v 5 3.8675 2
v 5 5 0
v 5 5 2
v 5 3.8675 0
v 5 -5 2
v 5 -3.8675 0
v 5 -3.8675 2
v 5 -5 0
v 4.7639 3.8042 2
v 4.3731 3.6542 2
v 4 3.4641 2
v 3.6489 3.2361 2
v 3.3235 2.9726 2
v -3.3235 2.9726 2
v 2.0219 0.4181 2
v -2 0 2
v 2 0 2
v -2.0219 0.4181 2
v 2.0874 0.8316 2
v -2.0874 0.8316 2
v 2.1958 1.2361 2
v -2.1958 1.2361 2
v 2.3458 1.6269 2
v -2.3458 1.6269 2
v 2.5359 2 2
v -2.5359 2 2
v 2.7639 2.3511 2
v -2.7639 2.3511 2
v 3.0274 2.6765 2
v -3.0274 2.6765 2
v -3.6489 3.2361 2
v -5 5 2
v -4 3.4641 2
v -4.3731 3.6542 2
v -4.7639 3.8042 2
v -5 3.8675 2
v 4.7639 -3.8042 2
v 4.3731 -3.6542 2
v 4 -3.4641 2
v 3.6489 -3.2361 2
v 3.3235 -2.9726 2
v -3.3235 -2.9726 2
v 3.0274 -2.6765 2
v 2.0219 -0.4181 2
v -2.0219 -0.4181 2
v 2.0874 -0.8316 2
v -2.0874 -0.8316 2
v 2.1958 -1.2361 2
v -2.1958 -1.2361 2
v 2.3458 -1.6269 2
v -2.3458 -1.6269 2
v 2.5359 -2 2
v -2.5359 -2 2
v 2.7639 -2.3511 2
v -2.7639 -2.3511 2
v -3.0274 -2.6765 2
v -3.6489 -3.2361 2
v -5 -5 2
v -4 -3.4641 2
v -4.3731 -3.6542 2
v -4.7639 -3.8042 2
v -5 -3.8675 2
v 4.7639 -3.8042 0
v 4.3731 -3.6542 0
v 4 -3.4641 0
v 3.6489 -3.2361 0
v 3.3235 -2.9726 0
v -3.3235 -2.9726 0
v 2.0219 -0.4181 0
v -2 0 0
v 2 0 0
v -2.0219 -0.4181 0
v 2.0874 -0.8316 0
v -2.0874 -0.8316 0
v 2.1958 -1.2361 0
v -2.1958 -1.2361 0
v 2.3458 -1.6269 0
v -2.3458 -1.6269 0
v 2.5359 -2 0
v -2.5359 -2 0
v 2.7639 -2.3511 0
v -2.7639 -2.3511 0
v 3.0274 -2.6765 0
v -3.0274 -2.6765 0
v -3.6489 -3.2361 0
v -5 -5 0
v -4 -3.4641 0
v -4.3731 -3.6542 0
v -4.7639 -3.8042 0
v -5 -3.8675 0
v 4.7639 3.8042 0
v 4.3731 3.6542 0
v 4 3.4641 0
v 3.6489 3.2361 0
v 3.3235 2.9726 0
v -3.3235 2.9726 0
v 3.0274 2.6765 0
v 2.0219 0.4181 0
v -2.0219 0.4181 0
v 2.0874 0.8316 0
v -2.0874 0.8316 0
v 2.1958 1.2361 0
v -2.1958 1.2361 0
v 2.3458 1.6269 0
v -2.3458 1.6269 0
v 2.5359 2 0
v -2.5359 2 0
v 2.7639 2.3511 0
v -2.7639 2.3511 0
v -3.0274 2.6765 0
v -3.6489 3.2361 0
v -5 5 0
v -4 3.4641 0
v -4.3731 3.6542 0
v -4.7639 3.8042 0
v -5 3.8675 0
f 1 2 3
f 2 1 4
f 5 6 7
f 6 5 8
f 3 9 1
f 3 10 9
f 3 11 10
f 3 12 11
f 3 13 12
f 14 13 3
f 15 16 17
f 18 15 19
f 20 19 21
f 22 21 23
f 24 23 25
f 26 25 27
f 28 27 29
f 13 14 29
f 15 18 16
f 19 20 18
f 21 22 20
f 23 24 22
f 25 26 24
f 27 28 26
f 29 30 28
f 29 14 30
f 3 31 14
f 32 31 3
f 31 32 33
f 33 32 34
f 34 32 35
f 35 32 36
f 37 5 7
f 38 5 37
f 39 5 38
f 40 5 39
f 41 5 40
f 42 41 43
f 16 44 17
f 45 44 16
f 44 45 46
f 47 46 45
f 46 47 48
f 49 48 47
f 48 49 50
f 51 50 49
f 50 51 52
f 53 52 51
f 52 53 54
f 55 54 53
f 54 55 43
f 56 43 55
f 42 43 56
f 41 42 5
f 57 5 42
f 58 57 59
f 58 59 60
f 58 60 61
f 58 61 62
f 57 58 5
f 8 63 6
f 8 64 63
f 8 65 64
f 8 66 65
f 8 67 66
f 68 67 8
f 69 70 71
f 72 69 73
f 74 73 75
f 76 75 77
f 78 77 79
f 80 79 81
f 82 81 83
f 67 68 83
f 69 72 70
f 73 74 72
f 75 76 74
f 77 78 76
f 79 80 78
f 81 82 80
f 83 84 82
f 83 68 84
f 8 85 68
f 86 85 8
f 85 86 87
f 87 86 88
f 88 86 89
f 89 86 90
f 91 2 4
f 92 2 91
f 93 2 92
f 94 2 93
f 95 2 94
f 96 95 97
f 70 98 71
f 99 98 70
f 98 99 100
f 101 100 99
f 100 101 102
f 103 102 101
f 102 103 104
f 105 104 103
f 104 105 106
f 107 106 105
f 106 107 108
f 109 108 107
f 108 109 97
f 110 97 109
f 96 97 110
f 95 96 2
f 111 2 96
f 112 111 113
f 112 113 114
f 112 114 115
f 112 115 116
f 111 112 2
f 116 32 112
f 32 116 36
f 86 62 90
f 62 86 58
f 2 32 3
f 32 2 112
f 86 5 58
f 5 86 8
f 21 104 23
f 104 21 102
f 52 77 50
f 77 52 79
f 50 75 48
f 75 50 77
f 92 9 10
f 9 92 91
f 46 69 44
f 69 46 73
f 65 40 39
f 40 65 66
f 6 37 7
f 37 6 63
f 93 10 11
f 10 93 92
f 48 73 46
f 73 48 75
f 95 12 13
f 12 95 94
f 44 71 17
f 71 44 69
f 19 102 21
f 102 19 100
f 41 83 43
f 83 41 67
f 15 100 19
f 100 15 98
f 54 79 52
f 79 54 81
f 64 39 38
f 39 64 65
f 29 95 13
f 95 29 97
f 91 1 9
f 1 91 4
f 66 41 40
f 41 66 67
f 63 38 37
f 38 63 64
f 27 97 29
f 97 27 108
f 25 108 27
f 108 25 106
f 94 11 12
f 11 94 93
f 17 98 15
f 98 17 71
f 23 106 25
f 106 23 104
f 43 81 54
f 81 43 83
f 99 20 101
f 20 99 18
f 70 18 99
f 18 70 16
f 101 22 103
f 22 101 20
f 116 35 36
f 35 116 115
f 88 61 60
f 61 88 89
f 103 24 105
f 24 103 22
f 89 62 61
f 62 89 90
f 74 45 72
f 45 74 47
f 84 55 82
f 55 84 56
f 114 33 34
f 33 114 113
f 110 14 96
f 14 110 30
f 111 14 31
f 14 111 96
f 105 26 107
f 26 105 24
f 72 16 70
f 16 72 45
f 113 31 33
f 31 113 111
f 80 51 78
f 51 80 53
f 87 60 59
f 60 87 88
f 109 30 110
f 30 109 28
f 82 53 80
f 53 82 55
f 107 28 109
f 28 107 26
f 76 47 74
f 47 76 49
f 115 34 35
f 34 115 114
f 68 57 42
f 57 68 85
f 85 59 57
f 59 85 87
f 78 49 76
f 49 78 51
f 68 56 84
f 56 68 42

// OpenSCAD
$fn = $preview ? 20 : 60;translate(v = [0, 0, 1]) {
	difference() {
		cube(center = true, size = [10, 10, 2]);
		translate(v = [6, 0, 0]) {
			cylinder(center = true, h = 2.5, r1 = 4, r2 = 4);
		}
		translate(v = [-6, 0, 0]) {
			cylinder(center = true, h = 2.5, r1 = 4, r2 = 4);
		}
	}
}
